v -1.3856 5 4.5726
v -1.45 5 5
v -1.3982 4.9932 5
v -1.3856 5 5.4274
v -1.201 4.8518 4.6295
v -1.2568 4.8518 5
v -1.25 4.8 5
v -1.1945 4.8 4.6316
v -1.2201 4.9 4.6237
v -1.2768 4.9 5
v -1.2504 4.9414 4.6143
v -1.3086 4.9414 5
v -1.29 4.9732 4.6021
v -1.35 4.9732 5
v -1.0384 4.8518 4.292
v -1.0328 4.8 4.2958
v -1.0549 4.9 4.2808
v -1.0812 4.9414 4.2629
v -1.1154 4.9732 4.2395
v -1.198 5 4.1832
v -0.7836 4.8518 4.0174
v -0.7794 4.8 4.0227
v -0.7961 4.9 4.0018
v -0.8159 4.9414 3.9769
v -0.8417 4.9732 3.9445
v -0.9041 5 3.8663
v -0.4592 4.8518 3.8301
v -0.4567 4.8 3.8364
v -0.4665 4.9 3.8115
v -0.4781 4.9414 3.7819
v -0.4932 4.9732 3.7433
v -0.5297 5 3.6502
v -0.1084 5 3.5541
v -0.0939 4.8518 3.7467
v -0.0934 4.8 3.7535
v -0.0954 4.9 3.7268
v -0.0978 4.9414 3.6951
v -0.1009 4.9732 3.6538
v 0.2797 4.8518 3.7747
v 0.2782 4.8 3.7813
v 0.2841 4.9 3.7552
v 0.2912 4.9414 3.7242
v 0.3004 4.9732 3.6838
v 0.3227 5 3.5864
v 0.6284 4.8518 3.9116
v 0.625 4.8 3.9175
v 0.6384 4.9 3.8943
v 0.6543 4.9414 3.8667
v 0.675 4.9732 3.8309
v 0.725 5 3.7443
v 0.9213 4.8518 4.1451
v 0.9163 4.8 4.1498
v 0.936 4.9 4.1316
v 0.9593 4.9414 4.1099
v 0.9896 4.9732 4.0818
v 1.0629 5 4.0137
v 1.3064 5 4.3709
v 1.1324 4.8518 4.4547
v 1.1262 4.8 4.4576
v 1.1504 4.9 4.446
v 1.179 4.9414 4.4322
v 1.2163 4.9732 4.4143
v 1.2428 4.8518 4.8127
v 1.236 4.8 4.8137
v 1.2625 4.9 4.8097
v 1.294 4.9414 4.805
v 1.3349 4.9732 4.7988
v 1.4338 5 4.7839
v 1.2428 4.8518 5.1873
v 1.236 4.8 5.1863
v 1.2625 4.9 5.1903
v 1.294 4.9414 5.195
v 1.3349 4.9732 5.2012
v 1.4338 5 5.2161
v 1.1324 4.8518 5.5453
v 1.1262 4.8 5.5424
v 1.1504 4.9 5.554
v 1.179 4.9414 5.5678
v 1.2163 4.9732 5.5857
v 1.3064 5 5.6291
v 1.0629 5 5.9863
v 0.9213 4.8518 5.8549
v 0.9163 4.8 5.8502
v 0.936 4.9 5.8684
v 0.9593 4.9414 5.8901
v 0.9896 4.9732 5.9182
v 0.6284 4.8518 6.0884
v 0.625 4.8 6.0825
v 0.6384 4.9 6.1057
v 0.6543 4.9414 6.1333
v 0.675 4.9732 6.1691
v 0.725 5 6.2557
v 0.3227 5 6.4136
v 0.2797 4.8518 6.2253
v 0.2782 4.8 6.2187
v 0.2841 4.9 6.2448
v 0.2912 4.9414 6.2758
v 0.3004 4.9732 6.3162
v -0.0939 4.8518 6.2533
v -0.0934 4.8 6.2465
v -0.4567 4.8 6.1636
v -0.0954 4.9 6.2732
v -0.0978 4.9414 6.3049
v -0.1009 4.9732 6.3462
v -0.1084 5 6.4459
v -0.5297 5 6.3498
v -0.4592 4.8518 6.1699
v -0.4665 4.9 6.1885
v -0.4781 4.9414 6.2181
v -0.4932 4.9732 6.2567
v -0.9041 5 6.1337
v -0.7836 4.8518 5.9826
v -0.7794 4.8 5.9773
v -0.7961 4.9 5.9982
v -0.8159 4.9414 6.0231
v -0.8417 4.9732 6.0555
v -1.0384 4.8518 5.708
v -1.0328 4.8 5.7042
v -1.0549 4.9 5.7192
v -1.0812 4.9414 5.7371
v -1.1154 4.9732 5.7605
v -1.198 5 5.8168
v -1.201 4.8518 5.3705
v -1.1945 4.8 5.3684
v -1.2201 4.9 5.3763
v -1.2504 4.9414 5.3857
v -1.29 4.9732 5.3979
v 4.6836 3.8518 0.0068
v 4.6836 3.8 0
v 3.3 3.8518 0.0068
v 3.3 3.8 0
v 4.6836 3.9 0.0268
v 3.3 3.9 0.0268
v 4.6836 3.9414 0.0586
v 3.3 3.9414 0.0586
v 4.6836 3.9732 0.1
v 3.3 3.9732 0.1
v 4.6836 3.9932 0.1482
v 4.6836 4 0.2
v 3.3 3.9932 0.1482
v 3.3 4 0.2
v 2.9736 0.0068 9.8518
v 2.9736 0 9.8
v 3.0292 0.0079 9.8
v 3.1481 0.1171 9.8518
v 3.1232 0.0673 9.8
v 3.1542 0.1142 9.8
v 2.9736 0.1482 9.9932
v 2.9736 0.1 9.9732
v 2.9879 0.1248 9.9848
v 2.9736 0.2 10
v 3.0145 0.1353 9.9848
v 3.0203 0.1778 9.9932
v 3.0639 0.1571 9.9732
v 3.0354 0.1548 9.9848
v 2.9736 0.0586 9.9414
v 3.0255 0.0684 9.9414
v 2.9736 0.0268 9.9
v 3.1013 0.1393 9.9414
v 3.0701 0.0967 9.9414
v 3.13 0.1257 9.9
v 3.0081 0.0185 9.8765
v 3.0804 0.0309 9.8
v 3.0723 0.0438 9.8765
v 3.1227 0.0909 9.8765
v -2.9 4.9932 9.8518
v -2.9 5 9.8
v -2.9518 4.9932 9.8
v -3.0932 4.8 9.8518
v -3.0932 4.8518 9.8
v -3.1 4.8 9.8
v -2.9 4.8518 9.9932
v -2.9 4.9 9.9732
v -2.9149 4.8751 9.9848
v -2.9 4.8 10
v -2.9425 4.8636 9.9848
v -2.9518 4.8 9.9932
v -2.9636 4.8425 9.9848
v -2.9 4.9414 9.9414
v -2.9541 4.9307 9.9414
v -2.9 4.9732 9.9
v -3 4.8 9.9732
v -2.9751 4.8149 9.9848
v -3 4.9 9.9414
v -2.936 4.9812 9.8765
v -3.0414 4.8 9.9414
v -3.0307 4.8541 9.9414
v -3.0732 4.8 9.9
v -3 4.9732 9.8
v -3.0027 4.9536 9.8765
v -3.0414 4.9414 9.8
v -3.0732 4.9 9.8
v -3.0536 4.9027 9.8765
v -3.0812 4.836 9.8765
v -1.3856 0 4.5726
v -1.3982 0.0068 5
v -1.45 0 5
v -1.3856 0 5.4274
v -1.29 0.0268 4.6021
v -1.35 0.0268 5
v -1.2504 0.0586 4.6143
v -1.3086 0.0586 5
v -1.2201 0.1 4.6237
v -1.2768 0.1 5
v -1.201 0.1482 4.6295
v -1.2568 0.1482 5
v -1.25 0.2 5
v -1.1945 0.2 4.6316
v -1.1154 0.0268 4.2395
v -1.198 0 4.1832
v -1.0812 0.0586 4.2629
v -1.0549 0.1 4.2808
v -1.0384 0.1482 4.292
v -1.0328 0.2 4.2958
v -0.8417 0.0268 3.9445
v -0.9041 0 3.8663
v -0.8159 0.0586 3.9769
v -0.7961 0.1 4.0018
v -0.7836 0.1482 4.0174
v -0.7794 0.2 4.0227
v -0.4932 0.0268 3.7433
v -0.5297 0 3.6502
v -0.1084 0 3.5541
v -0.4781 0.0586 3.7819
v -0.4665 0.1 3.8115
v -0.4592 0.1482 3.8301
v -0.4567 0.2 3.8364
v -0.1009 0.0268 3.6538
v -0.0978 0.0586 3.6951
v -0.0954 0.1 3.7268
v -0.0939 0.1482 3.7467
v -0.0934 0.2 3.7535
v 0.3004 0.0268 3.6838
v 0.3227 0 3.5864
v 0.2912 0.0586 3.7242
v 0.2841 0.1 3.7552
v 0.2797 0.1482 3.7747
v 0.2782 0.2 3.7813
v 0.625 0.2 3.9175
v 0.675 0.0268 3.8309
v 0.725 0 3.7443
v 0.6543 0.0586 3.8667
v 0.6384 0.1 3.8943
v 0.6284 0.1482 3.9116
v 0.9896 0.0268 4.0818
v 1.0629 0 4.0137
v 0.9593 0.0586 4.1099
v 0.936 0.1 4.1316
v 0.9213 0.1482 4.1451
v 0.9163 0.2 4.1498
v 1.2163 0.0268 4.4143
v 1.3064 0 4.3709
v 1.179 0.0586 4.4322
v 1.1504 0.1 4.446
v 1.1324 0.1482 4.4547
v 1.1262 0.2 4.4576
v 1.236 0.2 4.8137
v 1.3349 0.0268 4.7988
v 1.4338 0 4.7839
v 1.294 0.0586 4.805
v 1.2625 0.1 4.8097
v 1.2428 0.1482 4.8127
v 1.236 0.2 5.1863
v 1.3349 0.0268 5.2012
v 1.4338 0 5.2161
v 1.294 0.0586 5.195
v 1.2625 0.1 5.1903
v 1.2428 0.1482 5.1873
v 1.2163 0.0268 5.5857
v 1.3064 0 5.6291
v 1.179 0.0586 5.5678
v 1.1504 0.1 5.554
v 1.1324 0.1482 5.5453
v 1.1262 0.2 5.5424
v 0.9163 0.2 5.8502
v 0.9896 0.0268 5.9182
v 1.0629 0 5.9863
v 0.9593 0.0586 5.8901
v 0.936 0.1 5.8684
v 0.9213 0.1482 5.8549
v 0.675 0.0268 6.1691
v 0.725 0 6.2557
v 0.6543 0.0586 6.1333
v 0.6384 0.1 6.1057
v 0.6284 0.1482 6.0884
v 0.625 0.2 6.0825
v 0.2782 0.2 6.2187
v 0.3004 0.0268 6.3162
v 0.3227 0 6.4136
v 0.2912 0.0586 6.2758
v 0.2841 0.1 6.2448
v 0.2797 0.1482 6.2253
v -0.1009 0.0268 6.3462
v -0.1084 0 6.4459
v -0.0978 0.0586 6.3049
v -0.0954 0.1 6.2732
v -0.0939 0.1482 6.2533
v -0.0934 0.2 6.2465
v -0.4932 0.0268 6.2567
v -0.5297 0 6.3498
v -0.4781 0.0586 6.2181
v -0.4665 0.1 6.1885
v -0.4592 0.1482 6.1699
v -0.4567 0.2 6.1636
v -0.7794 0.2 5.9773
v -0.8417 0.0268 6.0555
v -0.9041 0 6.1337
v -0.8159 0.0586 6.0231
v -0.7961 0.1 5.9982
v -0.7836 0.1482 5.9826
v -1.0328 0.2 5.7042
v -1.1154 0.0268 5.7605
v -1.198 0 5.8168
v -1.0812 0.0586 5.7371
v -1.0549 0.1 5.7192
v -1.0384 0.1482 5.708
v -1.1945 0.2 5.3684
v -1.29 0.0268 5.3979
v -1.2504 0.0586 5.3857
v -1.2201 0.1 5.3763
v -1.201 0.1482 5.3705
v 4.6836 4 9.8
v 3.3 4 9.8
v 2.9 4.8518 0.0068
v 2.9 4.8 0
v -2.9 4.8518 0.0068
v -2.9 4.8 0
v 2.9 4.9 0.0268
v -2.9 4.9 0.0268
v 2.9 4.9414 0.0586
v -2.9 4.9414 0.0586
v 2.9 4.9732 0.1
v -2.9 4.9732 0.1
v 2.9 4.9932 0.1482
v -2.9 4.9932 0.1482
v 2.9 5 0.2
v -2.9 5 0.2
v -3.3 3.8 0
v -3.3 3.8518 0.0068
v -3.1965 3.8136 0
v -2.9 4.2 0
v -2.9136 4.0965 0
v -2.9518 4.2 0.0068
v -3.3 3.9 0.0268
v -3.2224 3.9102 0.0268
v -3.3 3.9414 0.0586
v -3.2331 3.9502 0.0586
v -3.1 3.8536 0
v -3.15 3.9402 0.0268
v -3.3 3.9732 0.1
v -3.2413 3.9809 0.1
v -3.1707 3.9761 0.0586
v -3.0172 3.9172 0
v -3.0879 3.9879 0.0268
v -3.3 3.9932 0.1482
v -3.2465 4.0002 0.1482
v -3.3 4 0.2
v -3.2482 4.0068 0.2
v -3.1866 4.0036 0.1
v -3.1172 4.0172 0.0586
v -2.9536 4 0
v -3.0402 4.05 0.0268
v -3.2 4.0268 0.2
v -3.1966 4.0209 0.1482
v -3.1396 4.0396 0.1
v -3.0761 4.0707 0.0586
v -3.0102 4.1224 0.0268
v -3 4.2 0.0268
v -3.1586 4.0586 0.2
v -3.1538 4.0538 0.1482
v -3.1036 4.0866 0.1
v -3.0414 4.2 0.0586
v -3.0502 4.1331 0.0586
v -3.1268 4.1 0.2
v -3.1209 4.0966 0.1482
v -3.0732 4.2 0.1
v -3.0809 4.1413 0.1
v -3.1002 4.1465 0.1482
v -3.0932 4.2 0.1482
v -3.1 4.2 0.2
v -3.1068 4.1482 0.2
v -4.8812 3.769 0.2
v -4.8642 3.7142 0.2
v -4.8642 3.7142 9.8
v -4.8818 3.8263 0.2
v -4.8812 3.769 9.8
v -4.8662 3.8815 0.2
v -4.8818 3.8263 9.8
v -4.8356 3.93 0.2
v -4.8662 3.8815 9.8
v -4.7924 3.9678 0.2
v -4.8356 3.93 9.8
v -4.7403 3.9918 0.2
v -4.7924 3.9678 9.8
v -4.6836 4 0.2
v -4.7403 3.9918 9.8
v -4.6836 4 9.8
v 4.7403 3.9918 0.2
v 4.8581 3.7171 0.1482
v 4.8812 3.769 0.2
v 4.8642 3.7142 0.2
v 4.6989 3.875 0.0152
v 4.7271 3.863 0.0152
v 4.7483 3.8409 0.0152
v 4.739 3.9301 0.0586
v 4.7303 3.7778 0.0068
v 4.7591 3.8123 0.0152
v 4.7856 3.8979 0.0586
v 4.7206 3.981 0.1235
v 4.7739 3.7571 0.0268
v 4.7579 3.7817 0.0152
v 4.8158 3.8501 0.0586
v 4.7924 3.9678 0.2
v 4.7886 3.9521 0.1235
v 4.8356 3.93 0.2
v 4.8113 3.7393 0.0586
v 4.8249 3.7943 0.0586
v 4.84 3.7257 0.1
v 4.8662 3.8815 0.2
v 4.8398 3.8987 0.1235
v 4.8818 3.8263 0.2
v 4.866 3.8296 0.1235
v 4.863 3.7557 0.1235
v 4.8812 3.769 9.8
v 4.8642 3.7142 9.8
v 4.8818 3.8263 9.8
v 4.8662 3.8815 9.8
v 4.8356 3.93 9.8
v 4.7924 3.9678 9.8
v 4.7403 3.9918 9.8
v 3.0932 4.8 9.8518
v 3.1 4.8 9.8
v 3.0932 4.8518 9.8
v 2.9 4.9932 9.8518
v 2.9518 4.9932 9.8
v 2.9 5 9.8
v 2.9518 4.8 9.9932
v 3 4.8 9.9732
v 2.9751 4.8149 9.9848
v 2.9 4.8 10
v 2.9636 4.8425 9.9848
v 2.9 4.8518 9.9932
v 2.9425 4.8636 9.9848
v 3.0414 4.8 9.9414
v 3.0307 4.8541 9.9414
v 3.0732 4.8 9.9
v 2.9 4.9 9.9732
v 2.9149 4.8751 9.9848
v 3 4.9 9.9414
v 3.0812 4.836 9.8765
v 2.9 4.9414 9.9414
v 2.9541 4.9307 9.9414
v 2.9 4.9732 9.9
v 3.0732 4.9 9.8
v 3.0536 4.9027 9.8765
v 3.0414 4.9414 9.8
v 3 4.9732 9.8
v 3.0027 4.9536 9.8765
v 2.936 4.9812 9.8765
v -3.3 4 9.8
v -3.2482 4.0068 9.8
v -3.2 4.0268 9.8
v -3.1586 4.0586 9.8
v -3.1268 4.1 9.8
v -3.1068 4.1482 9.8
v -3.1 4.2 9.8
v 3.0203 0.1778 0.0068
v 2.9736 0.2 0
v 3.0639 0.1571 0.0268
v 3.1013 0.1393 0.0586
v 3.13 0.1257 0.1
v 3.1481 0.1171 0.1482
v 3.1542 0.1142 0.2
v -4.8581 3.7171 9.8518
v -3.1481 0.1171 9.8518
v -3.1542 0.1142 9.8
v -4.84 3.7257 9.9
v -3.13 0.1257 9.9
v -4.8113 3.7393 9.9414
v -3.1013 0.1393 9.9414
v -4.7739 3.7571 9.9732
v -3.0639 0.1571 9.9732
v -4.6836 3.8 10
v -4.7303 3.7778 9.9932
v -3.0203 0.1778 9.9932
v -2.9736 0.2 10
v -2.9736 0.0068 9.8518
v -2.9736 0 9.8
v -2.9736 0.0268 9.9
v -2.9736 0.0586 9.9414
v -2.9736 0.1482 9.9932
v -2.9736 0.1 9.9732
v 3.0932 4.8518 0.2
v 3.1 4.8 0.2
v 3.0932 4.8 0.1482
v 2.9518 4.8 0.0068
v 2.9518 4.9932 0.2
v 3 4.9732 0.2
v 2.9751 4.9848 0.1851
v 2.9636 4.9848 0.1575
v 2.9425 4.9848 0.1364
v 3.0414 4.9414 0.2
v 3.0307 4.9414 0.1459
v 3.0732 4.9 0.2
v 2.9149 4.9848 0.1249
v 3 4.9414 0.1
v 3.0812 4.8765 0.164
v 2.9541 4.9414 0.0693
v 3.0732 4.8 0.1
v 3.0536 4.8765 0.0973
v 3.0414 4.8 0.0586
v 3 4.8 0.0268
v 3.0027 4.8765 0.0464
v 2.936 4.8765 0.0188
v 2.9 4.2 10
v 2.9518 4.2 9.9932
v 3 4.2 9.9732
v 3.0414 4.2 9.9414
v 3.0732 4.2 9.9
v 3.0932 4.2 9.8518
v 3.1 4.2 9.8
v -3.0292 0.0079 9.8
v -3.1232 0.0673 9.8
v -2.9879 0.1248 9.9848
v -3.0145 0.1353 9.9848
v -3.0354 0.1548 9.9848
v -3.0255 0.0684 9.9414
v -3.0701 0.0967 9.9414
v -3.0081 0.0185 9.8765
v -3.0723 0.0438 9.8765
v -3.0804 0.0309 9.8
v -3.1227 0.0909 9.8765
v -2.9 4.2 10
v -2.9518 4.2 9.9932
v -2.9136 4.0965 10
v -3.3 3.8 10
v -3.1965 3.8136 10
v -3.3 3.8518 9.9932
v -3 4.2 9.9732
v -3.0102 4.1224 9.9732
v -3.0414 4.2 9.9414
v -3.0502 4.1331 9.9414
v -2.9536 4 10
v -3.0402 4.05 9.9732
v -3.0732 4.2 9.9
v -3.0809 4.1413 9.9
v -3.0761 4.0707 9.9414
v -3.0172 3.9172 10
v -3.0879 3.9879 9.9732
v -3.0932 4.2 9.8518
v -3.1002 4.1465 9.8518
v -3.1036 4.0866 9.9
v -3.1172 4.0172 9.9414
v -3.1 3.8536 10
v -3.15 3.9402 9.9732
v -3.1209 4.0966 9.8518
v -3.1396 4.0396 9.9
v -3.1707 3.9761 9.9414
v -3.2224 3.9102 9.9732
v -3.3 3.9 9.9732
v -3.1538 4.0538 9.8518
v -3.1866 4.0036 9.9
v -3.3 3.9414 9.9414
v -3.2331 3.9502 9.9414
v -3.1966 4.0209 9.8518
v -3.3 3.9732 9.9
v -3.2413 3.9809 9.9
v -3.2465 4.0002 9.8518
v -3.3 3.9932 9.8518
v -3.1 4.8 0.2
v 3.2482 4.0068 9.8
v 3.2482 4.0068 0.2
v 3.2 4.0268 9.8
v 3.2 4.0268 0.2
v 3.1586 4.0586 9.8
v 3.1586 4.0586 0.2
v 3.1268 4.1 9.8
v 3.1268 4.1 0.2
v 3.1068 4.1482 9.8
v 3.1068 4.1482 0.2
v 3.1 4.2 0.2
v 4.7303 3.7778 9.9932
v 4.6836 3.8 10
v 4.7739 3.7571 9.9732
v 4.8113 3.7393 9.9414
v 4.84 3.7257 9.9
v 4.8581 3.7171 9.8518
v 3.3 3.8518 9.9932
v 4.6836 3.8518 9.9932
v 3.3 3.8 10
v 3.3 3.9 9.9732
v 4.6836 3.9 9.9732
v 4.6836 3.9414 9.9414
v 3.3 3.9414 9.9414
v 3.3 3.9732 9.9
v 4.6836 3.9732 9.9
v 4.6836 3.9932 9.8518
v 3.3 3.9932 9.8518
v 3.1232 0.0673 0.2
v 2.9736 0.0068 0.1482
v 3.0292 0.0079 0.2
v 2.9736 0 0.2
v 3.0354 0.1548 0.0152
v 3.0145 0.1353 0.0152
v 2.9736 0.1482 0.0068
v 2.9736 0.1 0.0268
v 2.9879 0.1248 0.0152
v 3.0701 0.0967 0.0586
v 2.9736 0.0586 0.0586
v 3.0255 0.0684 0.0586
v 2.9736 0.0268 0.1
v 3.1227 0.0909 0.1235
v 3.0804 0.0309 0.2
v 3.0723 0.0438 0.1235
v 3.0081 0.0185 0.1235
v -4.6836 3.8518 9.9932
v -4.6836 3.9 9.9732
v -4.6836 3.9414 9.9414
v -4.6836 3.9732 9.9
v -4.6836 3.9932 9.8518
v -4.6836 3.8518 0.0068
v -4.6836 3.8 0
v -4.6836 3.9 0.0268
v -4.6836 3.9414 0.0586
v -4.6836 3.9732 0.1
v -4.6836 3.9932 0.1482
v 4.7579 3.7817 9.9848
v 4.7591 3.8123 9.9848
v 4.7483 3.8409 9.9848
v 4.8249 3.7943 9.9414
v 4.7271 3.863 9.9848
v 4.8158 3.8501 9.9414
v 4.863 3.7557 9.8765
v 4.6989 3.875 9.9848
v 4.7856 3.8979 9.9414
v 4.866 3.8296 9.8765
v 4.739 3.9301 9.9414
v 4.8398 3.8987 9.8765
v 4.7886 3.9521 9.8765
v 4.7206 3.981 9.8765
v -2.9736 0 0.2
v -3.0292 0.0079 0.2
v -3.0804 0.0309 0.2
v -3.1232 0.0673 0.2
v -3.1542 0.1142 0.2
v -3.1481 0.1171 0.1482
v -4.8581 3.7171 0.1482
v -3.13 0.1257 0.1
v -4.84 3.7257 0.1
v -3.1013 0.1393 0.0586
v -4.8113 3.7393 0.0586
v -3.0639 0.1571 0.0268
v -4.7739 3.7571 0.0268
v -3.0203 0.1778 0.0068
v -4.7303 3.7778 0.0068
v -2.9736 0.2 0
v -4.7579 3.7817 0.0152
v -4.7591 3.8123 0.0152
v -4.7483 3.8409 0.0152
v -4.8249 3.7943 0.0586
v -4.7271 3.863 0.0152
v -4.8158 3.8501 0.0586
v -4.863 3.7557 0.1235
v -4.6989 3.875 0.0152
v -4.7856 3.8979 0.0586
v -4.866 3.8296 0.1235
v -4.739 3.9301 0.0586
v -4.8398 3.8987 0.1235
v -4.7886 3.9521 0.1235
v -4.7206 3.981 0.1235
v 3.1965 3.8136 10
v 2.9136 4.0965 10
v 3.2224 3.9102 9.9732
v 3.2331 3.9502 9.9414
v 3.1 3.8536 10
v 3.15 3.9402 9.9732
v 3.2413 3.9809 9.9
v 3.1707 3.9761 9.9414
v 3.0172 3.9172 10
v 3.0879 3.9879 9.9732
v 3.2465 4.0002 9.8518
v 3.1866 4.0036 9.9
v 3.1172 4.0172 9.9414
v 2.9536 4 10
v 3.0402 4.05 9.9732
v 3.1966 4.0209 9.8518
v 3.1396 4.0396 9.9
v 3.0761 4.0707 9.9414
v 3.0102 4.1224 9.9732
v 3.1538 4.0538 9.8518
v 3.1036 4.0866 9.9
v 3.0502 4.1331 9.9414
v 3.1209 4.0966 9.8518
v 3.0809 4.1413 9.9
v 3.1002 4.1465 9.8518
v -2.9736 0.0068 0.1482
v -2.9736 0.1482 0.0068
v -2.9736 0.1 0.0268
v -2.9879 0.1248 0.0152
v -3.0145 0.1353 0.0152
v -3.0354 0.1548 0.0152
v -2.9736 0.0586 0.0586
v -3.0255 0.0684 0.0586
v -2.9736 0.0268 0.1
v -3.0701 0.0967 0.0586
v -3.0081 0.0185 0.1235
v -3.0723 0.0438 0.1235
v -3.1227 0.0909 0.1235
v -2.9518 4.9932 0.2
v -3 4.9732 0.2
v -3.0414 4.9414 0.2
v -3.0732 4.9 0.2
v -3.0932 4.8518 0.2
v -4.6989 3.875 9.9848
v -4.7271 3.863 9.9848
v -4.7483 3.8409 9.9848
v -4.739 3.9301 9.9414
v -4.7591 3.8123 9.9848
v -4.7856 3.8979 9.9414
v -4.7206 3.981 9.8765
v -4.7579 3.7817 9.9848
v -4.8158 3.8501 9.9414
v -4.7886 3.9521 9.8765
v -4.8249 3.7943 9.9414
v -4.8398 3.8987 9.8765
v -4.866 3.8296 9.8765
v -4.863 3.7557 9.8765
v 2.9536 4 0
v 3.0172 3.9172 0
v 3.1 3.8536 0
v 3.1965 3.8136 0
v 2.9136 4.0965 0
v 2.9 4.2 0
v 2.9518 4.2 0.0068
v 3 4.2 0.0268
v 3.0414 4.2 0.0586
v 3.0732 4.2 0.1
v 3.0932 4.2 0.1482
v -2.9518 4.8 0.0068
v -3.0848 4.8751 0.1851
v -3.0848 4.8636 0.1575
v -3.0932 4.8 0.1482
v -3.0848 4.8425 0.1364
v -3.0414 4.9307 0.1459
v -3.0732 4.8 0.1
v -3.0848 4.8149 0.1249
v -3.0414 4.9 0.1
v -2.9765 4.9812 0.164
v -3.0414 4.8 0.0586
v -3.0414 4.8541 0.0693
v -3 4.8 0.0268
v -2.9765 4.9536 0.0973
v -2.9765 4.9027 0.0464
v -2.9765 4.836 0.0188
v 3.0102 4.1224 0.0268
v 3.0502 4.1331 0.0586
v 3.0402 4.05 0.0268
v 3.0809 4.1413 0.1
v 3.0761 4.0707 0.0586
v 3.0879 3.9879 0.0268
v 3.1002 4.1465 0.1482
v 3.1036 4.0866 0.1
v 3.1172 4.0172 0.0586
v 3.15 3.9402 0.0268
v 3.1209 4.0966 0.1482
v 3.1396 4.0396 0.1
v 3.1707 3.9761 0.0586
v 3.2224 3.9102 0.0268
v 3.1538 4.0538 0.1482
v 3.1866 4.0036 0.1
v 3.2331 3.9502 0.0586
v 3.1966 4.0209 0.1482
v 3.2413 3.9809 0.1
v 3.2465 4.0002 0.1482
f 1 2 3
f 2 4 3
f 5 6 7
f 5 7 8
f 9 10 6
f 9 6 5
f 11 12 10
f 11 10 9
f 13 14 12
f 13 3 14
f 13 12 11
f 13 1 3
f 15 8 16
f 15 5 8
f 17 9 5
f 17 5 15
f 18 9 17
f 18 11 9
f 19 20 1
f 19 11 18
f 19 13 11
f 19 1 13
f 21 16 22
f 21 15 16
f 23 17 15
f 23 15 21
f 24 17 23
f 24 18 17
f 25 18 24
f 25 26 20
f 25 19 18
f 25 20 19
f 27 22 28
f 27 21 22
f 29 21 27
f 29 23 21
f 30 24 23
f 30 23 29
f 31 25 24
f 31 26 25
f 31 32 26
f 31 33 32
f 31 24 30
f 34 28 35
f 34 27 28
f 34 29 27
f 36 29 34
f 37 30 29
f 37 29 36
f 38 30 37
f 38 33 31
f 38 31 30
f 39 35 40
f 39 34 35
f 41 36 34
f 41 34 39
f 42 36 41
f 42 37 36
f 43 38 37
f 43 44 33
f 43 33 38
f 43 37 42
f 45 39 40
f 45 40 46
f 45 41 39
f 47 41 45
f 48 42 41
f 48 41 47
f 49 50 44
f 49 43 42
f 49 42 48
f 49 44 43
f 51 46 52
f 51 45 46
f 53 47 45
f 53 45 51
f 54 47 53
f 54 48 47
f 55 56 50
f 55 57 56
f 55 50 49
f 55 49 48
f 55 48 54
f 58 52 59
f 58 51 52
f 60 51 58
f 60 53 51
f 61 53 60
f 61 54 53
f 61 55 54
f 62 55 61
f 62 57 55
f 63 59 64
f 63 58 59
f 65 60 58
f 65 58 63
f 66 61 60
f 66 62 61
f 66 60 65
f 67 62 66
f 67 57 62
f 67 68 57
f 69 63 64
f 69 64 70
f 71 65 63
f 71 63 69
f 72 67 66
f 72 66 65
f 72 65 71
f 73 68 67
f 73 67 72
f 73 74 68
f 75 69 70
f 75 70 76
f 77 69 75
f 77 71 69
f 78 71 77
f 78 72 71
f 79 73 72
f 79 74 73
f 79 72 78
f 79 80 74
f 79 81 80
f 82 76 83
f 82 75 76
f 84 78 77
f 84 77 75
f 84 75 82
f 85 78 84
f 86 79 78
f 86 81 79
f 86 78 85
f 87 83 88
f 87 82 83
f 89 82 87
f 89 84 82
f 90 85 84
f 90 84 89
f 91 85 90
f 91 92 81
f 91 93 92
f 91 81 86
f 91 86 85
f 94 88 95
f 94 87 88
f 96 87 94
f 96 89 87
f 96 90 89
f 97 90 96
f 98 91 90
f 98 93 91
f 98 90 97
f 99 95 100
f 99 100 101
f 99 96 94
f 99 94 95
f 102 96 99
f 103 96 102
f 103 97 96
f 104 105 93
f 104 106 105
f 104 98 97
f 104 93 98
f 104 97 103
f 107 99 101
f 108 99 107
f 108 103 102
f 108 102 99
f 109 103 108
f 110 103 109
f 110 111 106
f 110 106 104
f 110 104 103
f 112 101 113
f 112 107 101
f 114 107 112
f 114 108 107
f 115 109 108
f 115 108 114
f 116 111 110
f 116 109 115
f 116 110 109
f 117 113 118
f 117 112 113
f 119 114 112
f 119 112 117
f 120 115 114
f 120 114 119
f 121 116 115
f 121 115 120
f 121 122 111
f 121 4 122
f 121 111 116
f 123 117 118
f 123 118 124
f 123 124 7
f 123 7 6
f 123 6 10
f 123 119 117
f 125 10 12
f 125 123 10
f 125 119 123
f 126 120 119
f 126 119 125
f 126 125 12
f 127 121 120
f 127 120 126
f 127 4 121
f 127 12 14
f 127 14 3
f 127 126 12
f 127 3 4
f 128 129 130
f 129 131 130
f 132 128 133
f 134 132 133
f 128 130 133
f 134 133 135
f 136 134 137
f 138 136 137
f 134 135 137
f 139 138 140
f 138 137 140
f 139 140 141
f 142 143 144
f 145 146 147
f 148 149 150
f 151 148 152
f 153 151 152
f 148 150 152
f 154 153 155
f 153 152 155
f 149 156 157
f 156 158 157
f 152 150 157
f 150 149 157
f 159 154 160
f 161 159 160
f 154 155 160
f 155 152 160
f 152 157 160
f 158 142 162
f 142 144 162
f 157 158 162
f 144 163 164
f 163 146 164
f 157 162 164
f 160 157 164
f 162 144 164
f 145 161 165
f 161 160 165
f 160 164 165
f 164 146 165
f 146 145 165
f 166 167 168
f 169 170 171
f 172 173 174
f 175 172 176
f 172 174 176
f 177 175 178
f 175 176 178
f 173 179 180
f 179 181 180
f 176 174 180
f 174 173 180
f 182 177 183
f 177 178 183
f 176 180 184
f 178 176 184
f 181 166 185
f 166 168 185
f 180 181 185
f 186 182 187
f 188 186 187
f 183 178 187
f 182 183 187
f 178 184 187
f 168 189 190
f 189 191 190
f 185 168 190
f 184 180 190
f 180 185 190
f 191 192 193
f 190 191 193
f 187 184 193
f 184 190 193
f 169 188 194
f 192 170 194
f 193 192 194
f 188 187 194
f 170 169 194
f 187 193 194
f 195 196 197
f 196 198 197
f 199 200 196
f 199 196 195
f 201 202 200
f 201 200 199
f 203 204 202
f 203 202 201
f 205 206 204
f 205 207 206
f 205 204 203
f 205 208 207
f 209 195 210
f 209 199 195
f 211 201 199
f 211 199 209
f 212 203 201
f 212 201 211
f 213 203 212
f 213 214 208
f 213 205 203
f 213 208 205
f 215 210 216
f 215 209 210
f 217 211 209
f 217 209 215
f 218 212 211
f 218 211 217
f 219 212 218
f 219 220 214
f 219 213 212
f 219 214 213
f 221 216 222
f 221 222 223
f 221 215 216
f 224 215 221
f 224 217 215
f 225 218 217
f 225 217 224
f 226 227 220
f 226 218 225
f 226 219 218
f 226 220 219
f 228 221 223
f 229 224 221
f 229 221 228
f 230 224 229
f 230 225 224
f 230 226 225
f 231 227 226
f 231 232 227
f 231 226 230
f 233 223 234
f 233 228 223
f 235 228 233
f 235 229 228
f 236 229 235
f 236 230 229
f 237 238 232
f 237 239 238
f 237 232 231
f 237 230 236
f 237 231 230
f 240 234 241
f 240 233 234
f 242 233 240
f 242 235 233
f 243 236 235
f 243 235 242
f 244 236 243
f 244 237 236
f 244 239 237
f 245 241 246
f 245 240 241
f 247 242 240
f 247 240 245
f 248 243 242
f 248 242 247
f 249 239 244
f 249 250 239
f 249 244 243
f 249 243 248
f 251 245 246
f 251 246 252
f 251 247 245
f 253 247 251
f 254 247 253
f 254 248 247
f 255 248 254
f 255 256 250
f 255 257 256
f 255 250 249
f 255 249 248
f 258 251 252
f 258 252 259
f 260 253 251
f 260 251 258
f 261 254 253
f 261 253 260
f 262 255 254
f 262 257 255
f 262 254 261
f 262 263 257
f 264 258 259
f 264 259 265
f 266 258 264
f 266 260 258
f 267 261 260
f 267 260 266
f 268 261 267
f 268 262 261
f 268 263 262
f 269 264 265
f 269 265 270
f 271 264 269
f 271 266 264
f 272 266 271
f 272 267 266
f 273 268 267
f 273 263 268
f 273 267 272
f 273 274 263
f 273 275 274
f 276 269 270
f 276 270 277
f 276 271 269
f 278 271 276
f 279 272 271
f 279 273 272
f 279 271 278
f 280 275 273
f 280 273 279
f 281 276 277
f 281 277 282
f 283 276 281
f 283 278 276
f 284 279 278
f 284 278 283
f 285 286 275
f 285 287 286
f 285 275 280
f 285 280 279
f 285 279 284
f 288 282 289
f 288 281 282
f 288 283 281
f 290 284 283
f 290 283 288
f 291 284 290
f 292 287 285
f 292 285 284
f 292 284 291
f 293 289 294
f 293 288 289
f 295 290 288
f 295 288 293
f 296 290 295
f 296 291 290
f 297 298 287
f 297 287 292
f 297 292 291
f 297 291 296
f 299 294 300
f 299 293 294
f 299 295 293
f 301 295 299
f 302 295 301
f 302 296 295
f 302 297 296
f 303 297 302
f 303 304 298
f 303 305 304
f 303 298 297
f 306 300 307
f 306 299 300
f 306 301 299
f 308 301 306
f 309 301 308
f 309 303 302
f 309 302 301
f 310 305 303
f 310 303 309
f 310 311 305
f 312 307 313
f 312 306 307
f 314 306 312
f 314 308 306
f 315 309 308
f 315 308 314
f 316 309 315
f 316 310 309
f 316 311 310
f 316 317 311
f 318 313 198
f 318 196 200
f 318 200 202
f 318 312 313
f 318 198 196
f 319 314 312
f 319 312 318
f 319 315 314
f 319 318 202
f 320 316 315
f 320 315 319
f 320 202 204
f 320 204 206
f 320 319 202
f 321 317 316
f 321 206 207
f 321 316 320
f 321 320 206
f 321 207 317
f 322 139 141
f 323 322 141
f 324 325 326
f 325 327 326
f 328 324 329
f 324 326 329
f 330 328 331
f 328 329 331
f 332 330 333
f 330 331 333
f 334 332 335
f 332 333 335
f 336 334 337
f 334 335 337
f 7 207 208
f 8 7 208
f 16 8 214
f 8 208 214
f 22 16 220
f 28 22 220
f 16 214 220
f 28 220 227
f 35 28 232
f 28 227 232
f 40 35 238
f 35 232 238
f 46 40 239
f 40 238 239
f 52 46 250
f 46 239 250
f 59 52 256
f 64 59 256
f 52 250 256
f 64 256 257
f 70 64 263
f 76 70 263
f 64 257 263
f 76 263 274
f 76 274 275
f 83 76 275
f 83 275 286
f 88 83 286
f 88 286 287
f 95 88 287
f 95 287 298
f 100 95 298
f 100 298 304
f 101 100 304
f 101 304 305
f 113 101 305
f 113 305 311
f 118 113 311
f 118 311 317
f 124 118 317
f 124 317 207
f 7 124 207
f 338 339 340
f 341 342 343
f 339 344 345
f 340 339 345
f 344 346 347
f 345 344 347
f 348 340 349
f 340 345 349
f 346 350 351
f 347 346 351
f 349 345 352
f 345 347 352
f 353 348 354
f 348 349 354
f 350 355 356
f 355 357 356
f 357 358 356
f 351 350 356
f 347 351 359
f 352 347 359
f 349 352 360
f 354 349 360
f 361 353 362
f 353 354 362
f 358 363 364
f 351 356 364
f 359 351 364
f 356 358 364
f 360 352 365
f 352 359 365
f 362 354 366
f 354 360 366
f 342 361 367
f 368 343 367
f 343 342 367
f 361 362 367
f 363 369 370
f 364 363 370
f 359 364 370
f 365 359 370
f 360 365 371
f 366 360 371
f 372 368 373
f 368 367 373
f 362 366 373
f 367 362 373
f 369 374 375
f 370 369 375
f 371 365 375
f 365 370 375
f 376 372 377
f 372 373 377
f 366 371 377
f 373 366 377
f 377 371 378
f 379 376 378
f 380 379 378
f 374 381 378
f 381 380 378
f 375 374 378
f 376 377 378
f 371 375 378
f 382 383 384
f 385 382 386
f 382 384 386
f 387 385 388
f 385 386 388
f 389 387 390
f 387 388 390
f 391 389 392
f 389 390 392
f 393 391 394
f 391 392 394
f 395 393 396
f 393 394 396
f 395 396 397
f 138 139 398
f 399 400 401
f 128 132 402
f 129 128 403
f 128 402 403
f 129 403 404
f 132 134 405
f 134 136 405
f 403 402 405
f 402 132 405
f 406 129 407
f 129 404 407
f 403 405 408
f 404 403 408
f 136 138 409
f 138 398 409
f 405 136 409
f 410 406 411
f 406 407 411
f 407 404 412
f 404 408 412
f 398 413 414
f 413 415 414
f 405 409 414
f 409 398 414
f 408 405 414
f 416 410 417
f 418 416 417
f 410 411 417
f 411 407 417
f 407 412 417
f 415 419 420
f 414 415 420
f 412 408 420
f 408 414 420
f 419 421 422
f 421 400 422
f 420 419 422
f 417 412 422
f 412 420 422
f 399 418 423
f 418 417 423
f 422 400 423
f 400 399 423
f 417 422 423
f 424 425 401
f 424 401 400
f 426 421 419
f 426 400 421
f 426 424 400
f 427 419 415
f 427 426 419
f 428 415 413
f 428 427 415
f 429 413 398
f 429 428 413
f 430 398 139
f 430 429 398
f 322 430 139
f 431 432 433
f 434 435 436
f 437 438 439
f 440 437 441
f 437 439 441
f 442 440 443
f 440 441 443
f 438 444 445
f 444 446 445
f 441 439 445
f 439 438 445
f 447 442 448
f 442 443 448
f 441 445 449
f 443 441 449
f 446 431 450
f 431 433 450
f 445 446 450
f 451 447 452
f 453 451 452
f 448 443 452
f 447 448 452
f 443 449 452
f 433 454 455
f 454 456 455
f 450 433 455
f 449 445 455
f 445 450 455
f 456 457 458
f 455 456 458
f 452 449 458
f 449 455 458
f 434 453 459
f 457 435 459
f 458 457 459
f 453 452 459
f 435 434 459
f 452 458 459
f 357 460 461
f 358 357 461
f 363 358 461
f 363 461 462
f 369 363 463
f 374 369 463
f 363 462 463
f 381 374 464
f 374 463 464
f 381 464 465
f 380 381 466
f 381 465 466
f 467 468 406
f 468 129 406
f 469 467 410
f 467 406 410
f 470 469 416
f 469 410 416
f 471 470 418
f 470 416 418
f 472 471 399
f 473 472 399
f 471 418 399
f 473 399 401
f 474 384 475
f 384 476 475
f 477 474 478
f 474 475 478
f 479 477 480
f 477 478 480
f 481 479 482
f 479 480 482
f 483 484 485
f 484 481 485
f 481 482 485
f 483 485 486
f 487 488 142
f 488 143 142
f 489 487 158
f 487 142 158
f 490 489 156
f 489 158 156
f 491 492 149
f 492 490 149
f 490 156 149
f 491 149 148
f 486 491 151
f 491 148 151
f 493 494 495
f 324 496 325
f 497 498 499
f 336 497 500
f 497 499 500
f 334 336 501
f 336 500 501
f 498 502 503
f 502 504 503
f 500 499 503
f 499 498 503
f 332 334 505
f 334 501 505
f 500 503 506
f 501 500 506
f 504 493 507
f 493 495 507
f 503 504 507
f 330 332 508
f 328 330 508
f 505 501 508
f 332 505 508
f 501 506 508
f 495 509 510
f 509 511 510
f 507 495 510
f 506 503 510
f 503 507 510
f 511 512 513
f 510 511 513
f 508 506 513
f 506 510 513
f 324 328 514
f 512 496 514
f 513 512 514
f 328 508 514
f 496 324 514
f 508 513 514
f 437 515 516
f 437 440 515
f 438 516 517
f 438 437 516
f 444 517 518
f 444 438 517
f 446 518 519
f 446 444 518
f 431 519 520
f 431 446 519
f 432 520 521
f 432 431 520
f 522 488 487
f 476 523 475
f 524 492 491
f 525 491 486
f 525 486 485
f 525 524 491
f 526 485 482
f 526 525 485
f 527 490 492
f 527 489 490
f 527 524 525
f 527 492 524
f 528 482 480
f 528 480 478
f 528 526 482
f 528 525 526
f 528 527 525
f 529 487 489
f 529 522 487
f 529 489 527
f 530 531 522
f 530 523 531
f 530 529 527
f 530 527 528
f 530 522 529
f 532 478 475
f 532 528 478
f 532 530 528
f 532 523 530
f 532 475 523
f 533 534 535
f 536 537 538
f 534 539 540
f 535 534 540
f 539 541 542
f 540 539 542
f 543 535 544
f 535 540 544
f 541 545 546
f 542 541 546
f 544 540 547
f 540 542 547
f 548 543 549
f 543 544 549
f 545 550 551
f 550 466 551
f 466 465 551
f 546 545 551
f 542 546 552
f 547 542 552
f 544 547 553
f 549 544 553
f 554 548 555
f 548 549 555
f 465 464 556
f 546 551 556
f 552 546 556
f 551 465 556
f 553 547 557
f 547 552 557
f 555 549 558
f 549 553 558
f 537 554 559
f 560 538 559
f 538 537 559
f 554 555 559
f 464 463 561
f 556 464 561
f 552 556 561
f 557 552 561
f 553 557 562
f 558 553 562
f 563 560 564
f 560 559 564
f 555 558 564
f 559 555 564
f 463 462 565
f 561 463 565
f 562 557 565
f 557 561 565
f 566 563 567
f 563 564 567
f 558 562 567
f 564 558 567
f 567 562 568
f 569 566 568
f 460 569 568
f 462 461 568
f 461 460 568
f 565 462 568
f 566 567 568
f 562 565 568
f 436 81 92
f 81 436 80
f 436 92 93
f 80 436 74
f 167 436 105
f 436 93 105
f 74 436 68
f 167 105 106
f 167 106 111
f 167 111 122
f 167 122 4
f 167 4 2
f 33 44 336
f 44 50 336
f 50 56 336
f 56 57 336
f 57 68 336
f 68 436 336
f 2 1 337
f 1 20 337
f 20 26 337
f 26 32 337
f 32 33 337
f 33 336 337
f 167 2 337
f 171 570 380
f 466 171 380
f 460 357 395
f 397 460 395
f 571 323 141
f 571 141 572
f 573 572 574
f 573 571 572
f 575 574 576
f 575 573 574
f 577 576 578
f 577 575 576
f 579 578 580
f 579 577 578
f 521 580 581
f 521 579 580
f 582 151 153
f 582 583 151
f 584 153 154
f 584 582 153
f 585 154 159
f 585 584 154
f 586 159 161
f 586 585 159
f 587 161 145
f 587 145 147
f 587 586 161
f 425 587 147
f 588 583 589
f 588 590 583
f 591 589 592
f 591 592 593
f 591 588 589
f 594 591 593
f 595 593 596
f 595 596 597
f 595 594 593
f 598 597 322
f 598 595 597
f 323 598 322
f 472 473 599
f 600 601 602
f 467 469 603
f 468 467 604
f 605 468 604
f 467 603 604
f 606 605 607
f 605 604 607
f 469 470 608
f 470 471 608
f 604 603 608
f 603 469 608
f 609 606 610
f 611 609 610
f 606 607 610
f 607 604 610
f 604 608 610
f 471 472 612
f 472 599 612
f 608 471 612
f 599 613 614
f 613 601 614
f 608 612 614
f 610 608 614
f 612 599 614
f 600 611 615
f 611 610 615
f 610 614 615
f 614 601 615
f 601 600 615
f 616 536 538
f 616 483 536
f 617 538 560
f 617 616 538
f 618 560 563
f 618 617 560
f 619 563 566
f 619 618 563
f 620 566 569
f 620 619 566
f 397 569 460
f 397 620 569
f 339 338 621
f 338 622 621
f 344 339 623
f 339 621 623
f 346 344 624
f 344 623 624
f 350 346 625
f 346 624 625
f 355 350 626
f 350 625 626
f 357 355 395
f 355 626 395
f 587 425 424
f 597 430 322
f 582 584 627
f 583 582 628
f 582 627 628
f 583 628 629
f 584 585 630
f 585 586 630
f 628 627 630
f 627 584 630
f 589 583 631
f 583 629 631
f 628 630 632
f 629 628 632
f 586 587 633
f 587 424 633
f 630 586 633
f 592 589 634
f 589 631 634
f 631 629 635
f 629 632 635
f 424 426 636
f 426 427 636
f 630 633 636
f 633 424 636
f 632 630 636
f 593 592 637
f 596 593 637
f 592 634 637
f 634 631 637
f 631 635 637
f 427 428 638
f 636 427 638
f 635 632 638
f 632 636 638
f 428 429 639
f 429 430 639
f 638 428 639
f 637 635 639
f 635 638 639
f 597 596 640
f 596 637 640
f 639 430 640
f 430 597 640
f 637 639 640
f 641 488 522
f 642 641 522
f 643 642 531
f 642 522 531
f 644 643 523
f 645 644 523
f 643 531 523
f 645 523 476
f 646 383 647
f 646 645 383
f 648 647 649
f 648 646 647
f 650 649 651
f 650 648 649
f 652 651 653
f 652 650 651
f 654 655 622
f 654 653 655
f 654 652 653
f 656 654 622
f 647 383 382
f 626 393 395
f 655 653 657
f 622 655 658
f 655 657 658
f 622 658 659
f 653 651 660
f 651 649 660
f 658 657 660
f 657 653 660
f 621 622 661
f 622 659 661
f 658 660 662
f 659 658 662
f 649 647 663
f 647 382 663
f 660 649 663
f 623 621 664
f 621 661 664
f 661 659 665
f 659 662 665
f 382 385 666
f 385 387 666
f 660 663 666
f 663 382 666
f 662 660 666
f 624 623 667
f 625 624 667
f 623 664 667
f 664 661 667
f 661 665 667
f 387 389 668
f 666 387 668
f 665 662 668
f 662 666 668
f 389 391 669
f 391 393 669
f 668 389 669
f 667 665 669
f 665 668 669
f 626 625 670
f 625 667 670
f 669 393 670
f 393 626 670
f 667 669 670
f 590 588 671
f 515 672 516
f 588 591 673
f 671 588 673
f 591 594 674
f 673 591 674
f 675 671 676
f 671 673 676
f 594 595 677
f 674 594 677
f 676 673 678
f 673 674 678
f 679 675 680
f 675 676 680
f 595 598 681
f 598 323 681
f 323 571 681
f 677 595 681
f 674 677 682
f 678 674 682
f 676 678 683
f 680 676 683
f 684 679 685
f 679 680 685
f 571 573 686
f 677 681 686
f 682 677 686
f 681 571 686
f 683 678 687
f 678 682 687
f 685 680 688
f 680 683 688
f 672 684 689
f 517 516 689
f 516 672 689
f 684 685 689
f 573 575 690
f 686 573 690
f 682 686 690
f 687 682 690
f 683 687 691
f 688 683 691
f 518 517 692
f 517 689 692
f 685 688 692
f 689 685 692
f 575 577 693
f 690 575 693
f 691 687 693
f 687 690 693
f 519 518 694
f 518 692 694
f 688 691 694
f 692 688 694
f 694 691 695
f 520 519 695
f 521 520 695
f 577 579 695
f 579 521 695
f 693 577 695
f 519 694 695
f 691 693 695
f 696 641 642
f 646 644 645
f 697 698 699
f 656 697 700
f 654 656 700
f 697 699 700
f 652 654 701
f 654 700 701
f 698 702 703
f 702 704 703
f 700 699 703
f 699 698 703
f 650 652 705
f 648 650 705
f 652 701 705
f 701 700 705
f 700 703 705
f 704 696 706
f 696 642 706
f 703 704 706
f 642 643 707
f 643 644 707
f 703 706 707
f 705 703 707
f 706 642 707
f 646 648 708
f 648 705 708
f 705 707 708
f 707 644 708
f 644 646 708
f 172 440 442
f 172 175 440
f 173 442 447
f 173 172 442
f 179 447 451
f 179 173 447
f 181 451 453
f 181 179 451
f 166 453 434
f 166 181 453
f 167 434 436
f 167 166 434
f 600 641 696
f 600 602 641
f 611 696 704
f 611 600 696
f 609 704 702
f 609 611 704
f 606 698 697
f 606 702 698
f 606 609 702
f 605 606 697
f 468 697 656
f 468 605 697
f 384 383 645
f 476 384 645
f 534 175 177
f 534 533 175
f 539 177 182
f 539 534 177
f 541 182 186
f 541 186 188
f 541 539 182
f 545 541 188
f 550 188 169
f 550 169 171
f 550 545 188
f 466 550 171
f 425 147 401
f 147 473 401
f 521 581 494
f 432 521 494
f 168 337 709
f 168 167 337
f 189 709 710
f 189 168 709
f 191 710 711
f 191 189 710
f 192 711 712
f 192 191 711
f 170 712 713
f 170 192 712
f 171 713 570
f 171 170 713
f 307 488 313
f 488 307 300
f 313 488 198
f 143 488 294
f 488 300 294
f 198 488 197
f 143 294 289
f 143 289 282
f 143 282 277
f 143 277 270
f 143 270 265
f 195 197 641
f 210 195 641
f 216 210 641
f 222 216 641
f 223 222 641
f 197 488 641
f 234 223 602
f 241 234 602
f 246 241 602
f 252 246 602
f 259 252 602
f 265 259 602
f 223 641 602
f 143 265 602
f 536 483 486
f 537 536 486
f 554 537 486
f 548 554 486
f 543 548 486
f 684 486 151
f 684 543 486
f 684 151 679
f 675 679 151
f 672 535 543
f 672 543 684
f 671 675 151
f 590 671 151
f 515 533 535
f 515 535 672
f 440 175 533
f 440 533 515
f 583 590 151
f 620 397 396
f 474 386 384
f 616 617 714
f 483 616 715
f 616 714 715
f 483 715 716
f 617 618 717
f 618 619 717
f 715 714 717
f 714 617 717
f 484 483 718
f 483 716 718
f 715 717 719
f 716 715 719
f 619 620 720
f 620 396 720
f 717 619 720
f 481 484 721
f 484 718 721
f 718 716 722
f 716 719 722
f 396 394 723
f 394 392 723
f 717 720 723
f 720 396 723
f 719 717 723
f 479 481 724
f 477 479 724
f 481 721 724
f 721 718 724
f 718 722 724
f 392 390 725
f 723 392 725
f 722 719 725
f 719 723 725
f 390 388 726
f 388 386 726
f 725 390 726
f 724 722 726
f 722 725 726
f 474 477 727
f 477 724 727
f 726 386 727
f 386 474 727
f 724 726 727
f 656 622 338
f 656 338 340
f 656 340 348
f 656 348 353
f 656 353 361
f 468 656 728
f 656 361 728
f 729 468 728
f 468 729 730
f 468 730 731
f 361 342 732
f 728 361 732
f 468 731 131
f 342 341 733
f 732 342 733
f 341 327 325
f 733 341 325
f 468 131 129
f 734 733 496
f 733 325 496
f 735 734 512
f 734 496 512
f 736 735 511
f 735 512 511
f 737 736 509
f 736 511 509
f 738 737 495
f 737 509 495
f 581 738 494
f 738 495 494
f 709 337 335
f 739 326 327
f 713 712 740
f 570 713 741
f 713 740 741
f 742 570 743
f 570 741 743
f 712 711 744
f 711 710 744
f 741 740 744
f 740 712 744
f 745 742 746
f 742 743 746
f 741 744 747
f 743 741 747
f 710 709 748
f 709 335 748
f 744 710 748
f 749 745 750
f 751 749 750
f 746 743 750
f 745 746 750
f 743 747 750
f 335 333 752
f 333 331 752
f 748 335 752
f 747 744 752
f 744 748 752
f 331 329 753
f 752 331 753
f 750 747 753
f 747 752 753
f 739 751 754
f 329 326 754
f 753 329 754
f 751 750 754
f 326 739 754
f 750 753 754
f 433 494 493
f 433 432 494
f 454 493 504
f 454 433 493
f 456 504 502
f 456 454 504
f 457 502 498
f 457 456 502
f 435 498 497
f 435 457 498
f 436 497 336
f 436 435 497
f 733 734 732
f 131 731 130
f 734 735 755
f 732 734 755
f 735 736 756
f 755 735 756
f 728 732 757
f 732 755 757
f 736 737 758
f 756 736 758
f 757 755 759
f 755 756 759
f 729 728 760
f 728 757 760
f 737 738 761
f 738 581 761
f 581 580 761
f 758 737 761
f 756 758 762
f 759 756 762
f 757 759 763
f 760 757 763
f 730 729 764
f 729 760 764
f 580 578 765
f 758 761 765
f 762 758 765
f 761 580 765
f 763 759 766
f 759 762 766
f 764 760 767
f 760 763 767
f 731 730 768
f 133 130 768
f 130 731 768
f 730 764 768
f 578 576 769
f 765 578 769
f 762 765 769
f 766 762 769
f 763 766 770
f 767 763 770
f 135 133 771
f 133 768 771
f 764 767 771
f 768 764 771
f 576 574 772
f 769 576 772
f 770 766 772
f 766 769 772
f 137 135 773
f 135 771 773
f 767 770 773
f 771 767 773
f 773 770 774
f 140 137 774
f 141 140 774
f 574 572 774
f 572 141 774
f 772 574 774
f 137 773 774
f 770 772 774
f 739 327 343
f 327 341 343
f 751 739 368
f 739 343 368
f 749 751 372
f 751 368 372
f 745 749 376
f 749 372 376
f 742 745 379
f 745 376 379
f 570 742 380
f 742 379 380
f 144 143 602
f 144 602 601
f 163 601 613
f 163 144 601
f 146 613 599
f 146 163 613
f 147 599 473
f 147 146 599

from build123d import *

# Parameters (mm, degrees)
NUTEXTRUSION_DEPTH    = 10
M3X0_5_TAPPED_HOLE1_D = 2.5
COSMETIC_FILLETS_R    = 0.2


with BuildPart() as part:
    # MainSketch → NutExtrusion (new body)
    with BuildSketch(Plane.XY):
        Polygon((-3.1, 0), (3.1, 0), (5, 4), (3.1, 4), (3.1, 5), (-3.1, 5), (-3.1, 4), (-5, 4), align=None)
    extrude(amount=NUTEXTRUSION_DEPTH)

    # M3x0.5 Tapped Hole1 (through all)
    with Locations(Plane(origin=(0, 5, 0), x_dir=(1, 0, 0), z_dir=(0, 1, 0))):
        with Locations((0, -5)):
            Hole(M3X0_5_TAPPED_HOLE1_D / 2)

    # Cosmetic Fillets
    cosmetic_fillets_edges = [part.edges().sort_by_distance(p)[0] for p in [
        (4.05, 4, 0),
        (3.1, 4, 5),
        (3.1, 4.5, 0),
        (3.1, 5, 5),
        (0, 5, 0),
        (-3.1, 5, 5),
        (1.25, 5, 5),
        (1.25, 0, 5),
        (-3.1, 4.5, 0),
        (-3.1, 4, 5),
        (-4.05, 4, 0),
        (-5, 4, 5),
        (-4.05, 2, 0),
        (-3.1, 0, 5),
        (0, 0, 0),
        (0, 0, 10),
        (4.05, 2, 10),
        (4.05, 4, 10),
        (3.1, 4.5, 10),
        (0, 5, 10),
        (-3.1, 4.5, 10),
        (-4.05, 4, 10),
        (-4.05, 2, 10),
        (3.1, 0, 5),
        (4.05, 2, 0),
        (5, 4, 5),
    ]]
    fillet(cosmetic_fillets_edges, radius=COSMETIC_FILLETS_R)


solid = part.part
